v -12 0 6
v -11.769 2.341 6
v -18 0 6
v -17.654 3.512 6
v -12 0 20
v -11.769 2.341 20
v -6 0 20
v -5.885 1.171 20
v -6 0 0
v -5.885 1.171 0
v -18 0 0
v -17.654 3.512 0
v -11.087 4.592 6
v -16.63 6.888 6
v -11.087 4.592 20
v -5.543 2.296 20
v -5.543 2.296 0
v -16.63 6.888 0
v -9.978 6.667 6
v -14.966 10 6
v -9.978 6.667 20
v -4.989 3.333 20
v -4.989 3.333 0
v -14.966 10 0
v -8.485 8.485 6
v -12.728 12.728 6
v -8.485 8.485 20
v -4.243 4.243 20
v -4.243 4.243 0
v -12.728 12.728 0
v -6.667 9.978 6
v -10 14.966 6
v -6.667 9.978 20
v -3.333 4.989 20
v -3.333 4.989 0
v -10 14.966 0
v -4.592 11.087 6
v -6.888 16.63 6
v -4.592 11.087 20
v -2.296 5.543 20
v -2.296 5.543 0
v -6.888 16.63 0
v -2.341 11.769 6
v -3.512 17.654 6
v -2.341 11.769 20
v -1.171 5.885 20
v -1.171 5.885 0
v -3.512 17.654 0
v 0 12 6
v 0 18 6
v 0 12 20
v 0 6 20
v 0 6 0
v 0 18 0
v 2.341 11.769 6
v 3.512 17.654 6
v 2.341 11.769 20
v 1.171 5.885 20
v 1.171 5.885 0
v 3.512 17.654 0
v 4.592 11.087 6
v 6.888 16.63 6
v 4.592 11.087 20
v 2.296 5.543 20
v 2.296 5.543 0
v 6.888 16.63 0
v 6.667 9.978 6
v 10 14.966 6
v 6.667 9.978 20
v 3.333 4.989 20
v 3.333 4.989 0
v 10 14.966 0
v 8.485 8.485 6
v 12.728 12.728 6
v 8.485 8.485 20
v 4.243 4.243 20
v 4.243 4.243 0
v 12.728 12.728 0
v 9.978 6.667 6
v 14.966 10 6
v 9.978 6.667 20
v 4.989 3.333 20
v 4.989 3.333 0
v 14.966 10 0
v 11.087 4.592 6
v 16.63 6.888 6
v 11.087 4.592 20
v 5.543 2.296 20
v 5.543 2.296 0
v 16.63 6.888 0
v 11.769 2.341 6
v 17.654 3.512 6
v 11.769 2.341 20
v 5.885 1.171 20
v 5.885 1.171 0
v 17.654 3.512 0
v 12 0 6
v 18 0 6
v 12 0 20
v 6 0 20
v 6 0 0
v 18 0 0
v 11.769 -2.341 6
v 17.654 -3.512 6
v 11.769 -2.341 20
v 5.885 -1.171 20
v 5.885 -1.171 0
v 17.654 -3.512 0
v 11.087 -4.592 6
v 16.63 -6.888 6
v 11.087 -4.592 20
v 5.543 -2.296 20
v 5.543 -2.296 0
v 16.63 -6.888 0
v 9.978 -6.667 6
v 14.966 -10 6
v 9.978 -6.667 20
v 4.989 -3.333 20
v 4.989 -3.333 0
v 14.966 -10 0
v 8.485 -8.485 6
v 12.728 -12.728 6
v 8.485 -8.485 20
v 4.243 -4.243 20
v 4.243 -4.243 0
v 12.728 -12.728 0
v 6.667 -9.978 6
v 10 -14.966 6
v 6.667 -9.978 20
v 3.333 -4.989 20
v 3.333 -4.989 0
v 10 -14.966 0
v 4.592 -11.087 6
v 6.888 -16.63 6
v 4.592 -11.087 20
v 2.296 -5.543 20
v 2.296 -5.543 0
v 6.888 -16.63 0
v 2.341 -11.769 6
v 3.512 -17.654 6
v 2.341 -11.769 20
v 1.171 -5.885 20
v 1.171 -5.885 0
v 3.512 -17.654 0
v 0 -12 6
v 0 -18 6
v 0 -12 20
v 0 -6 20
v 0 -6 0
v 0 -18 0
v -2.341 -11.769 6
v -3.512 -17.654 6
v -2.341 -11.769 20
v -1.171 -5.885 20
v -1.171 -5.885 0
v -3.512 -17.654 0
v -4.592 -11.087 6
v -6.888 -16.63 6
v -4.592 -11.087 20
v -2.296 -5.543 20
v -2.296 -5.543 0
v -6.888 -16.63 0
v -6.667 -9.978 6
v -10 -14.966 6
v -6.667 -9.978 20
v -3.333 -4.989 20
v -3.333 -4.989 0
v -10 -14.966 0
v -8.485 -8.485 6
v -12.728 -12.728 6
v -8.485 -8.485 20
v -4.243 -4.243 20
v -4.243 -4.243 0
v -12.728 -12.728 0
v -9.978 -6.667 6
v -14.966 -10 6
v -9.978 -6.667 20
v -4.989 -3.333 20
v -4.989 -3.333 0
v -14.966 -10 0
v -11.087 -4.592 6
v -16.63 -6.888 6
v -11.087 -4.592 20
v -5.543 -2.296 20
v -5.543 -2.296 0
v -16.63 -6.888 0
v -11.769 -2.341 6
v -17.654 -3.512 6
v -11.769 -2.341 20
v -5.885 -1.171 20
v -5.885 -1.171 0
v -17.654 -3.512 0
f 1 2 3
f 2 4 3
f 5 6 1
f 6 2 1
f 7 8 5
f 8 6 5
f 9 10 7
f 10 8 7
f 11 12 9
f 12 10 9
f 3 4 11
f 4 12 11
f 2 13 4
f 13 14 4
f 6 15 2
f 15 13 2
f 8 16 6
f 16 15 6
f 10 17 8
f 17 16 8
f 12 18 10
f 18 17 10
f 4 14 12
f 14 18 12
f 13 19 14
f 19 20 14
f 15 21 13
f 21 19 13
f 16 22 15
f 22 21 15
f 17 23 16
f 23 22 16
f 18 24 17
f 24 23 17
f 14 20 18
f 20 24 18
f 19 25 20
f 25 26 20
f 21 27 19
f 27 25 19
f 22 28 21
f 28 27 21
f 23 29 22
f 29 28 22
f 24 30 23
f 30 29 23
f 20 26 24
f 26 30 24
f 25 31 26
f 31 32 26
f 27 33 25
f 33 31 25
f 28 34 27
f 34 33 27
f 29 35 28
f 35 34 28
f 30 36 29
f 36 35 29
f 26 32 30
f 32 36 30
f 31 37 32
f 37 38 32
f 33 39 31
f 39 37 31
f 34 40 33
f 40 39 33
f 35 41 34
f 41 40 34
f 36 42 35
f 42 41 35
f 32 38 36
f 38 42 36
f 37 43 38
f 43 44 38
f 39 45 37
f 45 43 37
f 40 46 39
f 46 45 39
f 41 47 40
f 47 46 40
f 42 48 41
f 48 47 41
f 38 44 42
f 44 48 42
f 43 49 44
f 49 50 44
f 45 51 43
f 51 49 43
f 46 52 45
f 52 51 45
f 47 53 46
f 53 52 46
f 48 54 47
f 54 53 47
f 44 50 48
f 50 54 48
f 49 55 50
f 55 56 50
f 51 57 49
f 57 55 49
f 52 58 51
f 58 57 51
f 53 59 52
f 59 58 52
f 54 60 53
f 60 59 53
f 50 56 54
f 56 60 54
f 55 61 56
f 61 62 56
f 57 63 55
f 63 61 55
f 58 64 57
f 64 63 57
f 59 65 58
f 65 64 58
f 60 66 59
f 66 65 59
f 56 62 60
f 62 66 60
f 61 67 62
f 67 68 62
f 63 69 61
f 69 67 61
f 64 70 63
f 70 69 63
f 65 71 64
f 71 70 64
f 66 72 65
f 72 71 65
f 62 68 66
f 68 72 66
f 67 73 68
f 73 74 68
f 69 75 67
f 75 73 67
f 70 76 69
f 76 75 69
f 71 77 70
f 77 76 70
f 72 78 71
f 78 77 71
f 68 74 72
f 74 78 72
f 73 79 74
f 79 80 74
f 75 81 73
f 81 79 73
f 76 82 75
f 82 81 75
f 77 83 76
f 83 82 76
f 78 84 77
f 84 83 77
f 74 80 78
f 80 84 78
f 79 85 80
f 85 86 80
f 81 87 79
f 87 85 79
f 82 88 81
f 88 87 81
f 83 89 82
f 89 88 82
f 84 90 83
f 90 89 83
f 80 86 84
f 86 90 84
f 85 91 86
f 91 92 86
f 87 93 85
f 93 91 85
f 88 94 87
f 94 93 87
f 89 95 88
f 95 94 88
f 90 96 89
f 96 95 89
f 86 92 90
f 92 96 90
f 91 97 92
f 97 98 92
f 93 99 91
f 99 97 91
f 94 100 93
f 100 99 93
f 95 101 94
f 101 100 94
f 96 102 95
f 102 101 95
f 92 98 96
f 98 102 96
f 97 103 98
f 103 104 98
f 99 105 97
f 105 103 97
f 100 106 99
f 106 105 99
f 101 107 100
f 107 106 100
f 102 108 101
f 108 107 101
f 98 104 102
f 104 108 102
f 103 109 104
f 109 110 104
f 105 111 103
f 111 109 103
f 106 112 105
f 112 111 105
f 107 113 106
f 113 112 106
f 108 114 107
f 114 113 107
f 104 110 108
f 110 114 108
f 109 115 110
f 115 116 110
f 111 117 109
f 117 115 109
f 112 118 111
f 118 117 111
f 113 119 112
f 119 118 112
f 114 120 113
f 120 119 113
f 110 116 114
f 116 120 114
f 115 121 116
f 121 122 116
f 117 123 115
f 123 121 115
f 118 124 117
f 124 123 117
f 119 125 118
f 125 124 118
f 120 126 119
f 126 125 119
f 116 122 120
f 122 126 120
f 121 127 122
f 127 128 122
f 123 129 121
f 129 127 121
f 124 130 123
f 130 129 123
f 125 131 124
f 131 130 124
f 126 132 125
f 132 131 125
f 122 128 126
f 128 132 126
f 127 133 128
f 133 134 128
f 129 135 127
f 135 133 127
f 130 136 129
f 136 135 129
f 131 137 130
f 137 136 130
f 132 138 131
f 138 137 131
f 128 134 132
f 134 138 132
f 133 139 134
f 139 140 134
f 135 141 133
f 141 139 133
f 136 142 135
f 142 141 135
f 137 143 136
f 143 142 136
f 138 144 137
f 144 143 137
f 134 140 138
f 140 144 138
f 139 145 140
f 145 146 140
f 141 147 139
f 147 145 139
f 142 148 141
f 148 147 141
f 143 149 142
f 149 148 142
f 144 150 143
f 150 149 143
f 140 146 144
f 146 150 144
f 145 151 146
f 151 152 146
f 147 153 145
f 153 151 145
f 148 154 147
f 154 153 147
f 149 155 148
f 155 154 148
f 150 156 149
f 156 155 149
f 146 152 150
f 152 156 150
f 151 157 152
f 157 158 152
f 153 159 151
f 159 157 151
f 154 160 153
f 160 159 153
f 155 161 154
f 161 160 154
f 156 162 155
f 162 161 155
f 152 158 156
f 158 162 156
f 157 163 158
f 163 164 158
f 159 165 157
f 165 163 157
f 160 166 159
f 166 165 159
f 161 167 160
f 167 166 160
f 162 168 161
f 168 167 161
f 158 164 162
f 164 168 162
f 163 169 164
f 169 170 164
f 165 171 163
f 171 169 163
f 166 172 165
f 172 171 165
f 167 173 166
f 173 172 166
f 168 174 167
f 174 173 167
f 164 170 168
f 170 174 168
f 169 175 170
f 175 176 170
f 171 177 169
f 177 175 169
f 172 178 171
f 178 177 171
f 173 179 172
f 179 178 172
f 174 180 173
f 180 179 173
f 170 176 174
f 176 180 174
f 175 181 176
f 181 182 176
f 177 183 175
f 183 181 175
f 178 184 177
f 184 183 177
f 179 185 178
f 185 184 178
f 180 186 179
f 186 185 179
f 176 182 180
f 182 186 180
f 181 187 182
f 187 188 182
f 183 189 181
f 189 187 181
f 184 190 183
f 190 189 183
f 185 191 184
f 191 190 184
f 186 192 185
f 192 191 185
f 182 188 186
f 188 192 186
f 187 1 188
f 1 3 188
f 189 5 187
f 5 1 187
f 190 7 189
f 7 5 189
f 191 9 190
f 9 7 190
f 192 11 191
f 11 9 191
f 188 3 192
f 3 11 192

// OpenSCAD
$fn = 32;

// ----------------------------------------------------------------------
// Revolved part: flanged bushing R18
// ----------------------------------------------------------------------

// --- parameters (mm) ---
bore_r = 6;               // bore radius
flange_r = 18;            // flange radius
flange_h = 6;             // flange thickness
sleeve_r = 12;            // sleeve radius
total_h = 20;             // overall height
revolve_angle = 360;      // revolve sweep, degrees

bore_d = 2 * bore_r;
flange_d = 2 * flange_r;
sleeve_d = 2 * sleeve_r;

profile = [[6, 0], [18, 0], [18, 6], [12, 6], [12, 20], [6, 20]];  // primary outline, 6 points, counter clockwise

// --- the one profile operation ---
rotate_extrude(angle = revolve_angle) polygon(points = profile);
